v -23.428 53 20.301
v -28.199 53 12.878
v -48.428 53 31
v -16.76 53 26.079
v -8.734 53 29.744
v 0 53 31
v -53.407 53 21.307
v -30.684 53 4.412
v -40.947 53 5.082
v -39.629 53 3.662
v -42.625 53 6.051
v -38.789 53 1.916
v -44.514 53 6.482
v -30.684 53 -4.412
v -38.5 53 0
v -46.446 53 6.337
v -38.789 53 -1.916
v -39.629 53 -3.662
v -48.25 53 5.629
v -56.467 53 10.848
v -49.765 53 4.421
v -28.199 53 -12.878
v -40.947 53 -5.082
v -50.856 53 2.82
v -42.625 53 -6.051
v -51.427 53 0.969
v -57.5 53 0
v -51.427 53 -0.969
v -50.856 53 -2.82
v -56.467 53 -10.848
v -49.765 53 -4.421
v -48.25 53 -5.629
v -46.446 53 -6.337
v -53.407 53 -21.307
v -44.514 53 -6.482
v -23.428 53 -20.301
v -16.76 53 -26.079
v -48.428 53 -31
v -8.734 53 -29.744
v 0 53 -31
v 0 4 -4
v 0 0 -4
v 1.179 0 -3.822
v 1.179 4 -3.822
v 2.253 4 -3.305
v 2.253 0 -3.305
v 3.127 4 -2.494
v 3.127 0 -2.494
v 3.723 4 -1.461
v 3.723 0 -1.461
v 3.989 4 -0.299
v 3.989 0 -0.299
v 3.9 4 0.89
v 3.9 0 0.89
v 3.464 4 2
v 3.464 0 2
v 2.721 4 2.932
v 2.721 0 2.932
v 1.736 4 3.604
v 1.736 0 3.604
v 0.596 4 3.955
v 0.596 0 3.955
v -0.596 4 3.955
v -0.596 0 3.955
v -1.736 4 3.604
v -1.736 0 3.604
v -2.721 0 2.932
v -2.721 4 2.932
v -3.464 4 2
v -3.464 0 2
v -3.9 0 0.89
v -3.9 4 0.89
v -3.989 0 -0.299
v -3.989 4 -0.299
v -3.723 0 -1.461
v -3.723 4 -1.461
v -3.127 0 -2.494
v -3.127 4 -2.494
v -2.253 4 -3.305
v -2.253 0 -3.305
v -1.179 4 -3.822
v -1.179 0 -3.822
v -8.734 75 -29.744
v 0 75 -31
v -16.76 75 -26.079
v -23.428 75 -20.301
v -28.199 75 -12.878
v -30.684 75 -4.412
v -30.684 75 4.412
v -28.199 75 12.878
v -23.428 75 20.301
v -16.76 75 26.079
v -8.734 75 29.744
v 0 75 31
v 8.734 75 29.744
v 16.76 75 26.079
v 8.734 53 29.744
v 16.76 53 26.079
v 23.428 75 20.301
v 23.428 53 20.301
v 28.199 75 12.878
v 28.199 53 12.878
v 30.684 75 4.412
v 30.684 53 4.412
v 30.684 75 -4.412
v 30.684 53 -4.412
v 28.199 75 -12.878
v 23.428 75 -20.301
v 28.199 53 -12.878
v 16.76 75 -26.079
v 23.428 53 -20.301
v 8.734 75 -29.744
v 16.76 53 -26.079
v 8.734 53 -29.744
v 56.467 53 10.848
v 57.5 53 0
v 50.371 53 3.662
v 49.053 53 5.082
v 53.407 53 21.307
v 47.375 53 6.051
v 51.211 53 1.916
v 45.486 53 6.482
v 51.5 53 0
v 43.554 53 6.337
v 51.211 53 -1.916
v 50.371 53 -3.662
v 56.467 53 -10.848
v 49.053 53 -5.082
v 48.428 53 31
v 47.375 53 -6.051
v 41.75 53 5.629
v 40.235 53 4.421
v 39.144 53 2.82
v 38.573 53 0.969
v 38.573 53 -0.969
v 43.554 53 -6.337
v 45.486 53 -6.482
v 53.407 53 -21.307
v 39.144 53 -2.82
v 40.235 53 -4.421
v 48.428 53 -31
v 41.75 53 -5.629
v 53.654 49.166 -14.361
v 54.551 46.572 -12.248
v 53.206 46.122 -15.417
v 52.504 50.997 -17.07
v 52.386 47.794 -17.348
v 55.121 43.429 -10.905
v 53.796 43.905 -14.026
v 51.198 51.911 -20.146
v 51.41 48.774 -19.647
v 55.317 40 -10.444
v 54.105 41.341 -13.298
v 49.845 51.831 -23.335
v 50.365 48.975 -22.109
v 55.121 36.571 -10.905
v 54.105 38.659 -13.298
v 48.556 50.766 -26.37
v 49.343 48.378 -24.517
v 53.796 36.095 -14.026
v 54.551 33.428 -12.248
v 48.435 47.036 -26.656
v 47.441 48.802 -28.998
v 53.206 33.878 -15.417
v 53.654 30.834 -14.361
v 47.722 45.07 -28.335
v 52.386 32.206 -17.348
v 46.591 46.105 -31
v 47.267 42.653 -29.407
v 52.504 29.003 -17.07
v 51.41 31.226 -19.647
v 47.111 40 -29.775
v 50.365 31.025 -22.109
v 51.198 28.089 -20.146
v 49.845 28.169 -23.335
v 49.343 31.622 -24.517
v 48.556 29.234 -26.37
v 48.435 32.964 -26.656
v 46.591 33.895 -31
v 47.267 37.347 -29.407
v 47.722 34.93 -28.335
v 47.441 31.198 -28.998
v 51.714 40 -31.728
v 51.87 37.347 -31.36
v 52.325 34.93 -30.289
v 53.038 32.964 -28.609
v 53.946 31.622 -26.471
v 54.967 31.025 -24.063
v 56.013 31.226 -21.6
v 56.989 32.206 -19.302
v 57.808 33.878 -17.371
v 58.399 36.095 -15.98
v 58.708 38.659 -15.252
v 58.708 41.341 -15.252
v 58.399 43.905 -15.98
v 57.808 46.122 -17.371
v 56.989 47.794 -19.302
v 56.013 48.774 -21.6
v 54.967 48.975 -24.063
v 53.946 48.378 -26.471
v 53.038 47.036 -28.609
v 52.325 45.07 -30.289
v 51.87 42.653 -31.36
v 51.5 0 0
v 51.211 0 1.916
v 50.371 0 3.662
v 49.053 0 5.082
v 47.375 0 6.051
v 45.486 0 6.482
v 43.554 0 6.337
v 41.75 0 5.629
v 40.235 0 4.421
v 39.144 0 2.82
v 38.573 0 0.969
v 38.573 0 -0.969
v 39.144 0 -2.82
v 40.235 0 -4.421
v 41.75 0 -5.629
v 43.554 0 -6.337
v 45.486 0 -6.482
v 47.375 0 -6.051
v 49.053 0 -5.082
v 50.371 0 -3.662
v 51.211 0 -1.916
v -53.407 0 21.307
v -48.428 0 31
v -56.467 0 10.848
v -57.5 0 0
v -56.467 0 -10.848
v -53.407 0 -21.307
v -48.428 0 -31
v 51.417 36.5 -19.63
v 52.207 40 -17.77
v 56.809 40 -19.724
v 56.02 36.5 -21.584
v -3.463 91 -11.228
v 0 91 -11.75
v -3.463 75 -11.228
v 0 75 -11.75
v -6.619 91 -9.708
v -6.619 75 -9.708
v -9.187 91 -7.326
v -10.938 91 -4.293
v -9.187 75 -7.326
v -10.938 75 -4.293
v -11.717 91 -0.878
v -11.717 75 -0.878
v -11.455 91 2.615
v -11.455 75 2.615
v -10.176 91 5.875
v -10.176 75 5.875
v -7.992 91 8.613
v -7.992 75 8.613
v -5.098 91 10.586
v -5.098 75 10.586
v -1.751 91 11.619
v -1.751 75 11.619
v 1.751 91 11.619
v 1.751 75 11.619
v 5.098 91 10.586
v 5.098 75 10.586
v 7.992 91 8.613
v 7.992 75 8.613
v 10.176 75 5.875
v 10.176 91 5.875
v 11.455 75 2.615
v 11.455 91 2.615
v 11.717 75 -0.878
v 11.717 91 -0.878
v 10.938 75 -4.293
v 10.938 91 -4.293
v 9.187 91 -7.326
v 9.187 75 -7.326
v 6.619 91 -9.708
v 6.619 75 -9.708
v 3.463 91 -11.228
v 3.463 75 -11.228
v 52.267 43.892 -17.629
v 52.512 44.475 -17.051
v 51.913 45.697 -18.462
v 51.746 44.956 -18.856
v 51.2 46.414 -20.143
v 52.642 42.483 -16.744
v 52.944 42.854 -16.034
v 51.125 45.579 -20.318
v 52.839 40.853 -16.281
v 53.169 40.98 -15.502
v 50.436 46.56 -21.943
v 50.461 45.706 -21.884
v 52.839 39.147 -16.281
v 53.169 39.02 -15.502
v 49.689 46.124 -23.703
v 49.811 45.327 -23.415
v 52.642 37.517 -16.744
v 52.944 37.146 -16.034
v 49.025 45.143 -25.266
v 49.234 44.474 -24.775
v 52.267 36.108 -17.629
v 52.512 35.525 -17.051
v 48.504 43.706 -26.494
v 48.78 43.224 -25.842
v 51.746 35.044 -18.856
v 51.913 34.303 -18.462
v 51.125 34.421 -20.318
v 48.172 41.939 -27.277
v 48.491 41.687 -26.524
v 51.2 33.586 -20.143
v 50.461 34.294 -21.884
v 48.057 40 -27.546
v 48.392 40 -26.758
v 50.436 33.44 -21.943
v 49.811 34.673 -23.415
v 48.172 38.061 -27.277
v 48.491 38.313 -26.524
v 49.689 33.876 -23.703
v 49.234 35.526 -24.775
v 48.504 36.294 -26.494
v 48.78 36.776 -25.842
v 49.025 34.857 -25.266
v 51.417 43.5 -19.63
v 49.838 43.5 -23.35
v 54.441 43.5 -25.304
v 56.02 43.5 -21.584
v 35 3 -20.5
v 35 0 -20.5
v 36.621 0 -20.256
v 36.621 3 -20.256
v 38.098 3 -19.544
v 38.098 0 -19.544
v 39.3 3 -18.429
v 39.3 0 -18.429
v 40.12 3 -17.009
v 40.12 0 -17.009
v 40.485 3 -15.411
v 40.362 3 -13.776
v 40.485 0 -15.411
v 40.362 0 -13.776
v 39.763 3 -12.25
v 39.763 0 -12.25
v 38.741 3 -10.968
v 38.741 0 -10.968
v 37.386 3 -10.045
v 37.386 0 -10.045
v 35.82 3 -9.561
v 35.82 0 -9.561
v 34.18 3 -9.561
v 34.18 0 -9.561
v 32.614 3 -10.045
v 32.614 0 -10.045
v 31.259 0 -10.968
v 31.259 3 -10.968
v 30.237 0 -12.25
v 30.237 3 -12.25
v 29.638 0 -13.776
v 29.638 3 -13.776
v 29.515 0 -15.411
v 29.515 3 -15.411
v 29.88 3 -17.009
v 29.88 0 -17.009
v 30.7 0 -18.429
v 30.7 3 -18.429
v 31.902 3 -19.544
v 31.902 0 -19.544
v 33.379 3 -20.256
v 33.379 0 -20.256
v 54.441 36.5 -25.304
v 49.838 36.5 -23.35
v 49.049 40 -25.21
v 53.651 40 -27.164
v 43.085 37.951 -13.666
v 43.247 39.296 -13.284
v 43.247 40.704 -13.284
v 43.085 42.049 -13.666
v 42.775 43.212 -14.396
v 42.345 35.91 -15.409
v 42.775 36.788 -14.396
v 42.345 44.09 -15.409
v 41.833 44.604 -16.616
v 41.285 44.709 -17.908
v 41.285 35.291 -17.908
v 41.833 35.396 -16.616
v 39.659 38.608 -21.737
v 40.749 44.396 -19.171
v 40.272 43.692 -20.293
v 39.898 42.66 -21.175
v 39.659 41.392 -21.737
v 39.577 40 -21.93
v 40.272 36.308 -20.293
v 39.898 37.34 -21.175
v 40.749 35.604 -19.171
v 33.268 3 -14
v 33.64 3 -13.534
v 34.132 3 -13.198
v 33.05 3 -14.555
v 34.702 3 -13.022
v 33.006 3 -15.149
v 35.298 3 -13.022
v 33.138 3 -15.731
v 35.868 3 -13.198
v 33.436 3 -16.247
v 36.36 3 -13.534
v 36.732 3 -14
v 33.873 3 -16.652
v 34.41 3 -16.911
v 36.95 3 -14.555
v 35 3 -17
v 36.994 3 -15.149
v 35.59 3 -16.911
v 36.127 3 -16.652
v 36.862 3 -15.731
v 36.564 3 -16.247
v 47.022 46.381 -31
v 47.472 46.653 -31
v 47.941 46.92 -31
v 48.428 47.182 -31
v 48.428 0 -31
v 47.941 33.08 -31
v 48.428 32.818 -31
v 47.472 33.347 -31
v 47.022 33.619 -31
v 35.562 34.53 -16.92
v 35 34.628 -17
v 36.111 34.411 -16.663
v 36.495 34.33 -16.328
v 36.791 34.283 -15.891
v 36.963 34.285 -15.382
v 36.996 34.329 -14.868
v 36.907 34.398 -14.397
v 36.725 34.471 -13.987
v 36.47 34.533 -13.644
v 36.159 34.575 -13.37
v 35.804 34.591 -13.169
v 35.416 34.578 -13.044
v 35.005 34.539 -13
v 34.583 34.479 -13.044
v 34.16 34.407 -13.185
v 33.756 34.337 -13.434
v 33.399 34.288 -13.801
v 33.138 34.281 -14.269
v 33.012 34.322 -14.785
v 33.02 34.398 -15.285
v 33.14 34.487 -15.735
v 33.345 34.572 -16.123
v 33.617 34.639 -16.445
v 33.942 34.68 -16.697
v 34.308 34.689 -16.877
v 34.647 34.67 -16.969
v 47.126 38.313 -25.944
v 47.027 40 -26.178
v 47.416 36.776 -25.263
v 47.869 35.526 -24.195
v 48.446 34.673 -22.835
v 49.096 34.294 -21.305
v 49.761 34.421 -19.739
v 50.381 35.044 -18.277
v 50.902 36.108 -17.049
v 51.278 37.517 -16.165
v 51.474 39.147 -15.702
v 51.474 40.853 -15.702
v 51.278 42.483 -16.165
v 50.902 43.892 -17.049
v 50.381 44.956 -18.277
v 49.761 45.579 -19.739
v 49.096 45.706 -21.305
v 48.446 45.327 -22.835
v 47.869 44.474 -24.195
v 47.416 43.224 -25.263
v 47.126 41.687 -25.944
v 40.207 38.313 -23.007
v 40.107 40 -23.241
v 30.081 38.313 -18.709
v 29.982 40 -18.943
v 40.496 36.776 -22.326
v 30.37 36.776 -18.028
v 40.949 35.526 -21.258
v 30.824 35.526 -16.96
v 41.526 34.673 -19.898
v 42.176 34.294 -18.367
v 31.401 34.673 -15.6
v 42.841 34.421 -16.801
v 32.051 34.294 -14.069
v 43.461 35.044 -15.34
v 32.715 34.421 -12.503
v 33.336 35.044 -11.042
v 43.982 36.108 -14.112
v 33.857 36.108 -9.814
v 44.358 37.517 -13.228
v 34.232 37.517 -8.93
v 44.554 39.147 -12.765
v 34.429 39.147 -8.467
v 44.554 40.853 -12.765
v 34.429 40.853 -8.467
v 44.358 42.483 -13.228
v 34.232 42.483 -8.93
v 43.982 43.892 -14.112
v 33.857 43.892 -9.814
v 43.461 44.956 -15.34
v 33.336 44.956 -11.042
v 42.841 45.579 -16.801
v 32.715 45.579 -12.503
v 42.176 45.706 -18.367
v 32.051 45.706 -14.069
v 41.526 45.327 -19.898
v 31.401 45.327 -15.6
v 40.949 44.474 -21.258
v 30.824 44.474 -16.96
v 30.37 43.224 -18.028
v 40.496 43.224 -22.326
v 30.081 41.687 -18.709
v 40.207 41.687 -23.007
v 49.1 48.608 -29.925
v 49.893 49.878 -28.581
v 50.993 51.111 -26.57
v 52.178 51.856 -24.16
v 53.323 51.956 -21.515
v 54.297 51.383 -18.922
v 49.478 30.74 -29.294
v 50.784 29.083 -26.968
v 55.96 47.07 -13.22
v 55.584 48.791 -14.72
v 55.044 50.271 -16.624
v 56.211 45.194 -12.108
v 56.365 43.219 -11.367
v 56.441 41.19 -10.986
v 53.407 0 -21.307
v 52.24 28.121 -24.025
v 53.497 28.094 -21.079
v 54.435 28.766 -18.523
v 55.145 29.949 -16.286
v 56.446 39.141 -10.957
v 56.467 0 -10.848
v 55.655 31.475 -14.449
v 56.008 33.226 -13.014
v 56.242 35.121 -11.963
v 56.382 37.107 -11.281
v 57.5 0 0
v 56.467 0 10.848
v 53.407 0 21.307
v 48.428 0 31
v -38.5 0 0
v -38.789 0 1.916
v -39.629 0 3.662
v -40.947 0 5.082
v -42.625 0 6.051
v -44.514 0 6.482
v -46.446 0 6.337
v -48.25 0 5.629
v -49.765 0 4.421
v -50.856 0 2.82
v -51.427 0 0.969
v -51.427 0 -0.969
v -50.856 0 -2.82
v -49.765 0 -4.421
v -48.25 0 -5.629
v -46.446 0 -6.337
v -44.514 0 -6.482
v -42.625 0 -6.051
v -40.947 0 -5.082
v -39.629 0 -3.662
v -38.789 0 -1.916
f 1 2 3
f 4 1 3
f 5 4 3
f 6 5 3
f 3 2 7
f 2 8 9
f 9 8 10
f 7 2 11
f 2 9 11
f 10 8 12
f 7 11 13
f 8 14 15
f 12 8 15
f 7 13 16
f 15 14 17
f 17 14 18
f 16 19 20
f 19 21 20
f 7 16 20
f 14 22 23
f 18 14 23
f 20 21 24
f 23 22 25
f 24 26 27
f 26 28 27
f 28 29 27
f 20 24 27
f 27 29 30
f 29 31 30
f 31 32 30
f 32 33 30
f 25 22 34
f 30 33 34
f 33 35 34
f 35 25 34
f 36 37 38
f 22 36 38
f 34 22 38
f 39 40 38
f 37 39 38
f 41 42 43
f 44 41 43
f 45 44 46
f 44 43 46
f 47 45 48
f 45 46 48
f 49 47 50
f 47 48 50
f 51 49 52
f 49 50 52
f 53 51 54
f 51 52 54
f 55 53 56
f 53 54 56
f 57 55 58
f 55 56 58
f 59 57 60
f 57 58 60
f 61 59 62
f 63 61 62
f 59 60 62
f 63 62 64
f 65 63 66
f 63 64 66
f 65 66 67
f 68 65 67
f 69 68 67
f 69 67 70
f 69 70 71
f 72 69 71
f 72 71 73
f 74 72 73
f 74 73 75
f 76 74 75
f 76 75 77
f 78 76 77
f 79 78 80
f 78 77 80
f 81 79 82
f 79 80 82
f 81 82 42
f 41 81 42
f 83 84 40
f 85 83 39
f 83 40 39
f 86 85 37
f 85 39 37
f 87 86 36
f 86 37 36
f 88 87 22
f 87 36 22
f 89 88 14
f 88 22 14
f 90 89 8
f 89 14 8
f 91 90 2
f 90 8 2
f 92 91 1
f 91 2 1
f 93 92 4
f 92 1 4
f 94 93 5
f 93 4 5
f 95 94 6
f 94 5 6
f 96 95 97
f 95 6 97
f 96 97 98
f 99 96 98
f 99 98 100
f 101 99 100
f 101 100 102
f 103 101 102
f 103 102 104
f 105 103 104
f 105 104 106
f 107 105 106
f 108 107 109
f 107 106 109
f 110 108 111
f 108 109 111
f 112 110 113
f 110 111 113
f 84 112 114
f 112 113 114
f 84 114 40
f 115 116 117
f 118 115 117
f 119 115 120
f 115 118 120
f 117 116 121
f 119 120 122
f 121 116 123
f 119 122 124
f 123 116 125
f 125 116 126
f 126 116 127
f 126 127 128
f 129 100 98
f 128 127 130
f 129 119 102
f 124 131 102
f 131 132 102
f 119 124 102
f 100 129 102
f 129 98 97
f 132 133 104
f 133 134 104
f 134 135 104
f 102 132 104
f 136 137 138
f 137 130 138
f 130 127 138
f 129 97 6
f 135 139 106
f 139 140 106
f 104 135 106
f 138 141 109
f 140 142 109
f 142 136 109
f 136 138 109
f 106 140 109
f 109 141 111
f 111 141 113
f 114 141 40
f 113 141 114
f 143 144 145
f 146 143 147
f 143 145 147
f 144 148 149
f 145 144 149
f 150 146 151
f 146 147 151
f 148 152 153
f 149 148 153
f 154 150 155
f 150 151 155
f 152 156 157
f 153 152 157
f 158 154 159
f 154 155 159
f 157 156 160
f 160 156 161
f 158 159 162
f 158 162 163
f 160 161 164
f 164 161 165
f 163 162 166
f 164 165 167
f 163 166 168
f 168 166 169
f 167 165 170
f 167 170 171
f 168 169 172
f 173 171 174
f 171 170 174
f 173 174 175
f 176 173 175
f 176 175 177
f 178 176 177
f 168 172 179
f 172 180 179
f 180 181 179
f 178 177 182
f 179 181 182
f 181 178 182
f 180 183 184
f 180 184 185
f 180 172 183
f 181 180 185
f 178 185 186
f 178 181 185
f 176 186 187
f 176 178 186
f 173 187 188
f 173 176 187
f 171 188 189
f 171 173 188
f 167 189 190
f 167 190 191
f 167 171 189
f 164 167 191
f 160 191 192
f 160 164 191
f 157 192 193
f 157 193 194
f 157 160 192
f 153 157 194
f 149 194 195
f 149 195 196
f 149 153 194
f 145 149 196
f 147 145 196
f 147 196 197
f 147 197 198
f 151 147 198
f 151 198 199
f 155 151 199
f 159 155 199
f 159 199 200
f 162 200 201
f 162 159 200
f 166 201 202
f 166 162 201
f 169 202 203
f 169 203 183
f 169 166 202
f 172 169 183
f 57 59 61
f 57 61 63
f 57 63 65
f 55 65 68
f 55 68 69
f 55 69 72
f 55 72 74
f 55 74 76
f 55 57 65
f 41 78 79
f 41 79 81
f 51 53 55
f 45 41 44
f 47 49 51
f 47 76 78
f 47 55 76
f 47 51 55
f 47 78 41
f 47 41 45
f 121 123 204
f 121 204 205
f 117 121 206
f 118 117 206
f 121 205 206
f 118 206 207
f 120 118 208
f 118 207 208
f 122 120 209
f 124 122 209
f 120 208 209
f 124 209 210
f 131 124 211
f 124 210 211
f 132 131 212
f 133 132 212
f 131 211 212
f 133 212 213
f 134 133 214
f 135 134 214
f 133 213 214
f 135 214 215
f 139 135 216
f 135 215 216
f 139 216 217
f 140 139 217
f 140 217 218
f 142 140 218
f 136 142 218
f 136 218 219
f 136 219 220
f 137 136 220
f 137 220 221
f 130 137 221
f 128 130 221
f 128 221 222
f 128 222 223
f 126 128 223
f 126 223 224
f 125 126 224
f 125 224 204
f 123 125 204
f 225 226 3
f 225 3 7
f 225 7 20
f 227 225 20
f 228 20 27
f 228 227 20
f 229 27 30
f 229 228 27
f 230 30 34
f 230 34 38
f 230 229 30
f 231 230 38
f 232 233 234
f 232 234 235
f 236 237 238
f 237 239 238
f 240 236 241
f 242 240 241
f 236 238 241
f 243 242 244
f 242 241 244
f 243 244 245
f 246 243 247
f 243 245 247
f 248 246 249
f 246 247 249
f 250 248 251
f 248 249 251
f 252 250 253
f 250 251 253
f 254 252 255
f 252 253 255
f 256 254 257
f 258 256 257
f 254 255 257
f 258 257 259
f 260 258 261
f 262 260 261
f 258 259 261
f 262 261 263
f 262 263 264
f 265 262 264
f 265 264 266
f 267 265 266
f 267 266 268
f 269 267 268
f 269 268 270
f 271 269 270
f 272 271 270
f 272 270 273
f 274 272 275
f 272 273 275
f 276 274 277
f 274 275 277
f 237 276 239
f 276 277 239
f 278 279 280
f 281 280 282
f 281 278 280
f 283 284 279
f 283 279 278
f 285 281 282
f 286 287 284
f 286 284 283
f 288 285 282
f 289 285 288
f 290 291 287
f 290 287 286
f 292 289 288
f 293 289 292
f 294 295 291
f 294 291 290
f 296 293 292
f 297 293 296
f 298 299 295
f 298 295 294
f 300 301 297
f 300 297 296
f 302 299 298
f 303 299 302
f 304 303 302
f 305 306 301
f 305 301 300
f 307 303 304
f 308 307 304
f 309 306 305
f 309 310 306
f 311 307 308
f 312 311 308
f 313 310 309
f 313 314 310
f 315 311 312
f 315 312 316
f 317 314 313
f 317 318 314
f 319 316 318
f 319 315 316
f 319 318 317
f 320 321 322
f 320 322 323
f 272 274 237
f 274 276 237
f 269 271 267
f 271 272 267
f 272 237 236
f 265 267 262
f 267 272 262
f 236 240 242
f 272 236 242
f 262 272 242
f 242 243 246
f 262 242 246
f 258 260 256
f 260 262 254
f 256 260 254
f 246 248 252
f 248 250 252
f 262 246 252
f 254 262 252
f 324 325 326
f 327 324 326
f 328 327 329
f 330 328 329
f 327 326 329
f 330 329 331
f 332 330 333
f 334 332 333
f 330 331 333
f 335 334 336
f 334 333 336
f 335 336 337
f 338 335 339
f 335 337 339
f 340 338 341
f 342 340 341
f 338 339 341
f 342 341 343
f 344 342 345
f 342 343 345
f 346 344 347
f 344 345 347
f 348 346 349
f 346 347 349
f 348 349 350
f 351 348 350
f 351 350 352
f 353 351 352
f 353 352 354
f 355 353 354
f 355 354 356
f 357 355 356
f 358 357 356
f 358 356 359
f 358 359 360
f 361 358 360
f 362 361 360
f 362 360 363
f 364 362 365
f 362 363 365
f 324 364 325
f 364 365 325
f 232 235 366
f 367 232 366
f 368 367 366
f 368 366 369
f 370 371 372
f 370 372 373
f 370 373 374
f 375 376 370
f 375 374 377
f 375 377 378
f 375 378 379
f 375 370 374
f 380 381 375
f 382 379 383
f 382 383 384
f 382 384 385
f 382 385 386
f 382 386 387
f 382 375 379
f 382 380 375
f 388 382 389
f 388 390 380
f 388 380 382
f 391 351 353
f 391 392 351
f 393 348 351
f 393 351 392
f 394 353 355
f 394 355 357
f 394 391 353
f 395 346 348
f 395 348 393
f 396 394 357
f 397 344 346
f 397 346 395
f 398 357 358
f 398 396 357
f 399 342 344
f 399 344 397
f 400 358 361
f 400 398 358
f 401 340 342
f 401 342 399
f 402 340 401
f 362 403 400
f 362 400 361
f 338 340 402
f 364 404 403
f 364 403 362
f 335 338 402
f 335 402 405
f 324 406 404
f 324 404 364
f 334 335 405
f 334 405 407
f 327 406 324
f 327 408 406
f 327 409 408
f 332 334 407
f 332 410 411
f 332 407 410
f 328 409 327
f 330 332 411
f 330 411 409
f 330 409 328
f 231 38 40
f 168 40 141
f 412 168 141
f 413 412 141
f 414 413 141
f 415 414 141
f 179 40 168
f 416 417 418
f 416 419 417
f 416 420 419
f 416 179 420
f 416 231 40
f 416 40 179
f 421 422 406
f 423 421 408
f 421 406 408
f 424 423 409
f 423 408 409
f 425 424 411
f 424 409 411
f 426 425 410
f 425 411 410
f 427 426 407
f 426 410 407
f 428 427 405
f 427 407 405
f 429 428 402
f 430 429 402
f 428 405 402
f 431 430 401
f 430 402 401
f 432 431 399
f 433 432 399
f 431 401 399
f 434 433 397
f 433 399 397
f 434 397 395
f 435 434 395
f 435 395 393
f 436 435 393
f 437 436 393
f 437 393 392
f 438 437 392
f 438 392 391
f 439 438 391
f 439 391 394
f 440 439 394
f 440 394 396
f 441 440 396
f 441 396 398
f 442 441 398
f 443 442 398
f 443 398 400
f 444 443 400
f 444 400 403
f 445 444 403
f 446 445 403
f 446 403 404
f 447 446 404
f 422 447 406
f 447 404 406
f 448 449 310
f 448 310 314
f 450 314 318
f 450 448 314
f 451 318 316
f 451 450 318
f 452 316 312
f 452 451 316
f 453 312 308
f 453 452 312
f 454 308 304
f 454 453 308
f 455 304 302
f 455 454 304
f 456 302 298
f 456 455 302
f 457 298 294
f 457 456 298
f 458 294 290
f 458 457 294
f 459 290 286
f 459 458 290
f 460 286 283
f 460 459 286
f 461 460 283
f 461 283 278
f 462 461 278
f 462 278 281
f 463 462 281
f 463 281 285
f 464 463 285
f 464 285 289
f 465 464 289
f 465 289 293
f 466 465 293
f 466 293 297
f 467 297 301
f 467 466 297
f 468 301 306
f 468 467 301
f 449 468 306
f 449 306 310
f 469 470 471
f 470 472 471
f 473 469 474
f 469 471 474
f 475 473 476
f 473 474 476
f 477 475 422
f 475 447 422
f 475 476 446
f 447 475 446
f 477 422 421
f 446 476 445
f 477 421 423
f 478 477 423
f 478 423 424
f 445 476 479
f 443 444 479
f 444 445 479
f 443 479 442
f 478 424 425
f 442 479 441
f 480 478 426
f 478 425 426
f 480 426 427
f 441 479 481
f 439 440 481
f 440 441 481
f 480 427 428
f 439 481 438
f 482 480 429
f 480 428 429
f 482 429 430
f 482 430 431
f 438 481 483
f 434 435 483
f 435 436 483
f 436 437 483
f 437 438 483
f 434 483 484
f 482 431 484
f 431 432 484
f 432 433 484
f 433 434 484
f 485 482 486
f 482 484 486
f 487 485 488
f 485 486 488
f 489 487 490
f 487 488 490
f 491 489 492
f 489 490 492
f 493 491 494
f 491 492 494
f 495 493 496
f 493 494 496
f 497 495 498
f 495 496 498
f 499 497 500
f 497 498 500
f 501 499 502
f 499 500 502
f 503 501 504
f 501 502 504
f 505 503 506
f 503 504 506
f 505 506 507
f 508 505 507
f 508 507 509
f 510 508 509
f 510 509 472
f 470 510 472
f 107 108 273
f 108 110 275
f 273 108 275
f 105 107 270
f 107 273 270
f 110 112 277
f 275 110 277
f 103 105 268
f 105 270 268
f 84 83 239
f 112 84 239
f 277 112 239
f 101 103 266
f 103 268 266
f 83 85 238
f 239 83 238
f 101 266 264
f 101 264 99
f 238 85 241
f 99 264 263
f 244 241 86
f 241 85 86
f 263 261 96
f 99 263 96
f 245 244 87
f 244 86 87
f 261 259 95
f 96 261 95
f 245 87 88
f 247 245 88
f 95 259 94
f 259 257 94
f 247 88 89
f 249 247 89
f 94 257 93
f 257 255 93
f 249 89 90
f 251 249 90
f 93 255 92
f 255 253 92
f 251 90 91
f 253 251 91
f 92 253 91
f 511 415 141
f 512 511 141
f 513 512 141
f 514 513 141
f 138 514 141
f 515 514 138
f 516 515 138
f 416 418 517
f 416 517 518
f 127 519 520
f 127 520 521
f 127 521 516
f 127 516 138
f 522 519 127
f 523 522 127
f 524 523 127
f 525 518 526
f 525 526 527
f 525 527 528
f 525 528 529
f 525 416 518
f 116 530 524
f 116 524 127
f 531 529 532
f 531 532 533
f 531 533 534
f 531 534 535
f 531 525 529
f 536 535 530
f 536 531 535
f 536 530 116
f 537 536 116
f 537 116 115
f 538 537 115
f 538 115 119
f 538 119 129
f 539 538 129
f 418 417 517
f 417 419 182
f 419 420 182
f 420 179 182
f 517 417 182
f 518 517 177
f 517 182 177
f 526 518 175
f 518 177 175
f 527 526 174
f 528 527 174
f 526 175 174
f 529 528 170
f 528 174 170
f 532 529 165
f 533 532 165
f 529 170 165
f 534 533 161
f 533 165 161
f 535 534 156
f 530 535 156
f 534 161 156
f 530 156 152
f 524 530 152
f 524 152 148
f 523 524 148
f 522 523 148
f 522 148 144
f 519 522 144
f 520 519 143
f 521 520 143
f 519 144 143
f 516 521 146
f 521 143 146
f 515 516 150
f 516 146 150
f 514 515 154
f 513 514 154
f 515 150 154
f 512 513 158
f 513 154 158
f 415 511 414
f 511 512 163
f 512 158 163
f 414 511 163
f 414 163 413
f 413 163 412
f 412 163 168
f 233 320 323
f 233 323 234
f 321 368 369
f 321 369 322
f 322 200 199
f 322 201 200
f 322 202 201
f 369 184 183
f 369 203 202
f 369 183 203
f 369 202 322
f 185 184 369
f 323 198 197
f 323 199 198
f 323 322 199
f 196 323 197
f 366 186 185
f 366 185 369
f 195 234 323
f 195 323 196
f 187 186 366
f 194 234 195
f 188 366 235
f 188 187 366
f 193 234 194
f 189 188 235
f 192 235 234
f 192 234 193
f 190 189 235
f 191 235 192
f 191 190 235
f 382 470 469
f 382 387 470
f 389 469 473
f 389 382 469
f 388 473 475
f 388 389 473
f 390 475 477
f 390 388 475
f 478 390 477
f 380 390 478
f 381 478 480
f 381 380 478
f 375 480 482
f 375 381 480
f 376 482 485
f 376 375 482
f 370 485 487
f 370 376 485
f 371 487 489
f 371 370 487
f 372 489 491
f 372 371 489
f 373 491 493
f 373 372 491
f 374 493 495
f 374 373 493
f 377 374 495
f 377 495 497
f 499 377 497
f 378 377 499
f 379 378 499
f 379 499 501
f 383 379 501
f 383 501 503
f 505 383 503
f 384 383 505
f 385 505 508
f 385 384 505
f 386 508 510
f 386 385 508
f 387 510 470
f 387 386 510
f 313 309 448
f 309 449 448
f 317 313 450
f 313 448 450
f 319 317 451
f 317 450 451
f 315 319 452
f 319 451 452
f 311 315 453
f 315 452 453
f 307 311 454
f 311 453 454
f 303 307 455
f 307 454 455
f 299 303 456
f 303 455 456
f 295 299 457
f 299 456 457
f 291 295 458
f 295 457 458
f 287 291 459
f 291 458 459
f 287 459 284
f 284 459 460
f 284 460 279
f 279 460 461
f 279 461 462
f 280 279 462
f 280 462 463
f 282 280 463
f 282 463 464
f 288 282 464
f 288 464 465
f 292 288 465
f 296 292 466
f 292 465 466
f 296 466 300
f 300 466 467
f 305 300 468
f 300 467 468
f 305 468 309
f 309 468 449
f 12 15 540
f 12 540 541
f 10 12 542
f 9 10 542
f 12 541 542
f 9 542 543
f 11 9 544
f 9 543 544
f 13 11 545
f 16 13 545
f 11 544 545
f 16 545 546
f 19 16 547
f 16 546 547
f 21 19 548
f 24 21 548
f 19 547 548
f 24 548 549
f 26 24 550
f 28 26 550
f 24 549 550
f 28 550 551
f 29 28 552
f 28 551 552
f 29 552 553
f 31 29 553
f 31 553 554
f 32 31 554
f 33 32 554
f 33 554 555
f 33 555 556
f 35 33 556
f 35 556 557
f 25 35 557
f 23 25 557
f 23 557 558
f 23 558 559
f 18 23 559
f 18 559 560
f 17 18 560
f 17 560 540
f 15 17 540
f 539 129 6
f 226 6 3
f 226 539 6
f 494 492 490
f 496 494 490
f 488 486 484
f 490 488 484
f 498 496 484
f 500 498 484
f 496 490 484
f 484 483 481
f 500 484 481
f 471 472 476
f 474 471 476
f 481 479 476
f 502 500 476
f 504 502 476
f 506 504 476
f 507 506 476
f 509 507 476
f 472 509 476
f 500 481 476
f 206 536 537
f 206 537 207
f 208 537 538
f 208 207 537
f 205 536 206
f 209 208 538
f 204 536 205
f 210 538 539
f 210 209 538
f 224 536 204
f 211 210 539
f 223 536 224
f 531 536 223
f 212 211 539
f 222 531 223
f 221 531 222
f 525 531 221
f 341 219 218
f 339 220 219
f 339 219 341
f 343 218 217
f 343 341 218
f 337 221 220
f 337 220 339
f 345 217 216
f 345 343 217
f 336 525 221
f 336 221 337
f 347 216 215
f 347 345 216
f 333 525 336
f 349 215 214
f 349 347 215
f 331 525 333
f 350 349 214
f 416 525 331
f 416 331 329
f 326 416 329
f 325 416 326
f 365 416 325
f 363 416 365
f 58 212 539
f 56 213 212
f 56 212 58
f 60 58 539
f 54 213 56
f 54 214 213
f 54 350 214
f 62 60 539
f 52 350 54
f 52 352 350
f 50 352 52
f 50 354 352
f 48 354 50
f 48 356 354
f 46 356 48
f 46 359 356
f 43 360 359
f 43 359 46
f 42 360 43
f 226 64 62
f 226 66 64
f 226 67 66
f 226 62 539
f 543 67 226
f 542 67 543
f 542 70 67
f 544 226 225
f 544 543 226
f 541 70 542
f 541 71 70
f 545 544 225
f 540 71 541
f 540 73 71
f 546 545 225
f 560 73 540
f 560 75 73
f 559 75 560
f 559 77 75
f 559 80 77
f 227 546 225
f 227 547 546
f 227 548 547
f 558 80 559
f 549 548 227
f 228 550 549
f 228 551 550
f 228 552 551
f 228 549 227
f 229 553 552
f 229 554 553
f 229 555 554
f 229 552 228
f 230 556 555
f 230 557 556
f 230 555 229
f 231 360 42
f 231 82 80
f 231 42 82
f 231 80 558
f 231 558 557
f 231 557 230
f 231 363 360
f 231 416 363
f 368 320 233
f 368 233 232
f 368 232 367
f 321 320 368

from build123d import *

# Parameters (mm, degrees)
EXTRUDE1_DEPTH     = 53
HOLE1_D            = 13
HOLE1_DEPTH        = 53
SKETCH5_R          = 4
CUT_EXTRUDE1_DEPTH = 4
SKETCH6_R          = 5.5
CUT_EXTRUDE2_DEPTH = 3
SKETCH7_R          = 2
CUT_EXTRUDE3_DEPTH = 33
CUT_EXTRUDE4_DEPTH = 5


with BuildPart() as part:
    # Sketch1 → Extrude1 (new body)
    with BuildSketch(Plane(origin=(0, 0, 0), x_dir=(1, 0, 0), z_dir=(0, 1, 0))):
        with BuildLine():
            Line((-48.427781283, 31), (48.427781283, 31))
            ThreePointArc((48.427781283, 31), (57.5, 0), (48.427781283, -31))
            Line((48.427781283, -31), (-48.427781283, -31))
            ThreePointArc((-48.427781283, -31), (-57.5, 0), (-48.427781283, 31))
        make_face()
    extrude(amount=EXTRUDE1_DEPTH)

    # Sketch2 → Revolve1 (revolve)
    with BuildSketch(Plane.XY, mode=Mode.PRIVATE) as revolve1_sk:
        Polygon((0, 91), (-11.75, 91), (-11.75, 75), (-31, 75), (-31, 53), (0, 53), align=None)
    revolve(revolve1_sk.sketch.rotate(Axis((0, 0, 0), (0, 1, 0)), 270), axis=Axis((0, 0, 0), (0, 1, 0)))  # turned: the seam where the file's is

    # Hole1
    with Locations(Plane(origin=(0, 53, 0), x_dir=(-1, 0, 0), z_dir=(0, 1, 0))):
        with Locations((45, 0), (-45, 0)):
            Hole(HOLE1_D / 2, depth=HOLE1_DEPTH)

    # Sketch5 → Cut-Extrude1 (cut)
    with BuildSketch(Plane.XZ):
        with Locations(Location((0, 0, 0), (0, 0, 270))):  # turned: the seam where the file's is
            Circle(SKETCH5_R)
    extrude(amount=-CUT_EXTRUDE1_DEPTH, mode=Mode.SUBTRACT)

    # Sketch6 → Cut-Extrude2 (cut)
    with BuildSketch(Plane.XZ):
        with Locations(Location((35, -15, 0), (0, 0, 270))):  # turned: the seam where the file's is
            Circle(SKETCH6_R)
    extrude(amount=-CUT_EXTRUDE2_DEPTH, mode=Mode.SUBTRACT)

    # Sketch7 → Cut-Extrude3 (cut)
    with BuildSketch(Plane.XZ.offset(-3)):
        with Locations(Location((35, -15, 0), (0, 0, 270))):  # turned: the seam where the file's is
            Circle(SKETCH7_R)
    extrude(amount=-CUT_EXTRUDE3_DEPTH, mode=Mode.SUBTRACT)

    # Sketch8 → Cut-Revolve1 (revolve, cut)
    with BuildSketch(Plane(origin=(0, 0, 0), x_dir=(0.920504853, 0, -0.390731128), z_dir=(0.390731128, 0, 0.920504853)), mode=Mode.PRIVATE) as cut_revolve1_sk:
        Polygon((57.5, 28), (55, 28), (55, 33.4215), (53.517364509, 34.2775), (35, 34.2775), (35, 40), (57.5, 40), align=None)
    revolve(cut_revolve1_sk.sketch.rotate(Axis((47.484793311, 40, -20.156098913), (-0.920504853, 0, 0.390731128)), 270), axis=Axis((47.484793311, 40, -20.156098913), (-0.920504853, 0, 0.390731128)), mode=Mode.SUBTRACT)  # turned: the seam where the file's is

    # Sketch9 → Revolve2 (revolve)
    with BuildSketch(Plane(origin=(0, 0, 0), x_dir=(0.920504853, 0, -0.390731128), z_dir=(0.390731128, 0, 0.920504853)), mode=Mode.PRIVATE) as revolve2_sk:
        Polygon((55, 31), (55, 34.2775), (46, 34.2775), (45, 35.2775), (45, 40), (60, 40), (60, 31), align=None)
    revolve(revolve2_sk.sketch.rotate(Axis((68.658528533, 40, -29.14381628), (-0.920504853, 0, 0.390731128)), 270), axis=Axis((68.658528533, 40, -29.14381628), (-0.920504853, 0, 0.390731128)))  # turned: the seam where the file's is

    # Sketch10 → Cut-Extrude4 (cut)
    with BuildSketch(Plane(origin=(55.230291207, 0, -23.443867709), x_dir=(-0.390731128, 0, -0.920504853), z_dir=(0.920504853, 0, -0.390731128))):
        Polygon((4.041451884, 40), (2.020725942, 43.5), (-2.020725942, 43.5), (-4.041451884, 40), (-2.020725942, 36.5), (2.020725942, 36.5), align=None)
    extrude(amount=-CUT_EXTRUDE4_DEPTH, mode=Mode.SUBTRACT)


solid = part.part
